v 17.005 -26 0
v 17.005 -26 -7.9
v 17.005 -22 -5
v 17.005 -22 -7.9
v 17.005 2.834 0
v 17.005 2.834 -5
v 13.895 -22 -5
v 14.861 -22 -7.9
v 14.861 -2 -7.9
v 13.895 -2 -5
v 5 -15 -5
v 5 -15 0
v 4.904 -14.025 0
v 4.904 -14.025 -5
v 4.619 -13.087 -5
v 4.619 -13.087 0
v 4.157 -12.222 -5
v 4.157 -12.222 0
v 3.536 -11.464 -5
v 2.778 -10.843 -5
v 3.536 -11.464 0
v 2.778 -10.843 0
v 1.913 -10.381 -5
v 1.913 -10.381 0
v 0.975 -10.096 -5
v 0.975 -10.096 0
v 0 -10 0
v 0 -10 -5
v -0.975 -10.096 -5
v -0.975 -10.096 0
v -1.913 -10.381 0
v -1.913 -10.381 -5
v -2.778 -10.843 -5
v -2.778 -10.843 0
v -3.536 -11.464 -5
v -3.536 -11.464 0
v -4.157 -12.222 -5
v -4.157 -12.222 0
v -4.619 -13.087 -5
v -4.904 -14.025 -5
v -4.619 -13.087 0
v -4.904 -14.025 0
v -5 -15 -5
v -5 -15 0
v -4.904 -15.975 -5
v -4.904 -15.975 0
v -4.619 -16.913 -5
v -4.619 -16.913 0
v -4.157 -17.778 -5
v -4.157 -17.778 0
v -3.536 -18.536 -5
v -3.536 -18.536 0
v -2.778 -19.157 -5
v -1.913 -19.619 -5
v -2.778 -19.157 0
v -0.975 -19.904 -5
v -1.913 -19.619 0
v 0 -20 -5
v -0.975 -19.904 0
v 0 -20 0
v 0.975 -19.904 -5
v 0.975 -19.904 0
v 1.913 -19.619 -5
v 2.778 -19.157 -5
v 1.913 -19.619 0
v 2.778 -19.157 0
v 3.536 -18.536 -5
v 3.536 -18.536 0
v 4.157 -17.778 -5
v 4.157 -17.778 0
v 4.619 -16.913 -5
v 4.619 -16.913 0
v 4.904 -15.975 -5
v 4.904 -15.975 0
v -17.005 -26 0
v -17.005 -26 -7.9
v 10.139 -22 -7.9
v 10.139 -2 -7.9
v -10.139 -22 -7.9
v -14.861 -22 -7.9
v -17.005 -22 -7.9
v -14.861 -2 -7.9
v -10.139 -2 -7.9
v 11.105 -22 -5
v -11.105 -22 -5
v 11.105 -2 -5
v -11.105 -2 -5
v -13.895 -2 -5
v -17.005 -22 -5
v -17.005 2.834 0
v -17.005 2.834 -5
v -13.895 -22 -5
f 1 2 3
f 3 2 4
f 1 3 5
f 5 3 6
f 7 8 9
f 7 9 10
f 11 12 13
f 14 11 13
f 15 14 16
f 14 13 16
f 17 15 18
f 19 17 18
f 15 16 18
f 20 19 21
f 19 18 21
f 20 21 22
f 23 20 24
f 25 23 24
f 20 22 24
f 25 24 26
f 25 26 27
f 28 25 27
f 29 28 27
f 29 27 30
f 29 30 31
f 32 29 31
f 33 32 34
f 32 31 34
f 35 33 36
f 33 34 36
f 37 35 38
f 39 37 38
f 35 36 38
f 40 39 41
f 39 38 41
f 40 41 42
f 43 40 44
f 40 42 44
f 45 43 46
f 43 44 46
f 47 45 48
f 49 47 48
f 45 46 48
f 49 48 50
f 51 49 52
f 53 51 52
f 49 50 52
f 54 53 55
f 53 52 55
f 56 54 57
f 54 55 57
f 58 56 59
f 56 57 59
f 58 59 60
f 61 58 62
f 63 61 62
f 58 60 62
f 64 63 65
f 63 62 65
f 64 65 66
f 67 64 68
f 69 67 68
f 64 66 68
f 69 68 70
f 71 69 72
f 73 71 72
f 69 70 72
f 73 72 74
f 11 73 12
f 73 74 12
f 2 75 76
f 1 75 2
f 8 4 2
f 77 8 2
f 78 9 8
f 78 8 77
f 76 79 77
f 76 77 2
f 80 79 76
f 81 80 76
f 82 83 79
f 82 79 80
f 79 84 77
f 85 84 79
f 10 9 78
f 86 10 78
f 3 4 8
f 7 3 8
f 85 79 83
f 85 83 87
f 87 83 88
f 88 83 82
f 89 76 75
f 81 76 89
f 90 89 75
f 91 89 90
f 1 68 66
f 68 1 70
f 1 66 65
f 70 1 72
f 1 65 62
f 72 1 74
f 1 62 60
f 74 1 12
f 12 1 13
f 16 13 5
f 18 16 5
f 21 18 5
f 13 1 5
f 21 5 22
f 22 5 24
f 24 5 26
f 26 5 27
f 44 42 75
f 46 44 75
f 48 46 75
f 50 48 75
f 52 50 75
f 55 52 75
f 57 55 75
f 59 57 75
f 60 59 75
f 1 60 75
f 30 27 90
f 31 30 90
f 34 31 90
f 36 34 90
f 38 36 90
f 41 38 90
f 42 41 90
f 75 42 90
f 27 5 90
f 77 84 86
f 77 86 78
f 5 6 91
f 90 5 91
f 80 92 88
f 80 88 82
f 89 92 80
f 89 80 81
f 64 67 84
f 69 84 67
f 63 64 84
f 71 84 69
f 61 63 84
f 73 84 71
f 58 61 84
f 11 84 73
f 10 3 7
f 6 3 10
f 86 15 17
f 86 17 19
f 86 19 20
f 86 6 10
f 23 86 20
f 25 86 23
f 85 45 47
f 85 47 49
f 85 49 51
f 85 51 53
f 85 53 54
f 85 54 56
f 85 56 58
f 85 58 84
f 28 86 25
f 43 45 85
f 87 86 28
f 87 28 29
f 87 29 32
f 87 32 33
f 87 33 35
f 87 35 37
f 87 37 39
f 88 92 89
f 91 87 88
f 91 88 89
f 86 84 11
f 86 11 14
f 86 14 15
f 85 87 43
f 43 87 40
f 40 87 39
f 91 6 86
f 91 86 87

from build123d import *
from OCP.BRepFilletAPI import BRepFilletAPI_MakeChamfer

# Parameters (mm, degrees)
SKETCH_1_R          = 5
EXTRUDE_1_DEPTH     = 5
EXTRUDE_2_REACH     = 42.012
EXTRUDE_3_DEPTH     = 55
EXTRUDE_4_DEPTH     = 20
FILLET_1_R          = 10
CHAMFER_1_SIZE      = 1
CHAMFER_1_SIZE2     = 1.741048535
CHAMFER_1_SIZE2_2   = 3.661578825
CHAMFER_1_SIZE2_3   = 2.732050808
CUT_EXTRUDE_1_REACH = 86.876
SKETCH_5_R          = 1.65
SKETCH_6_R          = 54.70604167
CUT_EXTRUDE_2_DEPTH = 66.501221402
SKETCH_7_W          = 77.77608505
SKETCH_7_H          = 88.124851988
SKETCH_7_W_2        = 34.010032192
SKETCH_7_H_2        = 31.175862843
CUT_EXTRUDE_3_DEPTH = 41.477277576


with BuildPart() as part:
    # 草图1 → 凸台-拉伸1 (new body)
    with BuildSketch(Plane.XY):
        Polygon((-20, 26), (20, 26), (30, 0), (20, -26), (-20, -26), (-30, 0), align=None)
        with Locations((0, -15)):
            Circle(SKETCH_1_R, mode=Mode.SUBTRACT)
    extrude(amount=-EXTRUDE_1_DEPTH)

    # 凸台-拉伸2: up to this plane
    extrude_2_end = Plane(origin=(0, 24.665063509, -42.72114317), z_dir=(0, 0.499999999999998, -0.8660254037844398))
    # 草图2 → 凸台-拉伸2 (add, up to the surface)
    with BuildSketch(Plane(origin=(0, 0, -5), x_dir=(-1, 0, 0), z_dir=(0, 0, -1)), mode=Mode.PRIVATE) as extrude_2_sk1:
        Polygon((-20, 26), (20, 26), (21.923076923, 21), (-21.923076923, 21), align=None)
    extrude_2_tool1 = split(extrude(extrude_2_sk1.sketch, amount=EXTRUDE_2_REACH, mode=Mode.PRIVATE), bisect_by=extrude_2_end, keep=Keep.BOTH, mode=Mode.PRIVATE)
    add(extrude_2_tool1.solids().sort_by_distance((0, 23.461774, -5))[0])

    # 草图3 → 凸台-拉伸3 (add)
    with BuildSketch(Plane(origin=(0, 0, -5), x_dir=(-1, 0, 0), z_dir=(0, 0, -1))):
        Polygon((23.846153846, -16), (20, -26), (-20, -26), (-23.846153846, -16), (-19.560495915, -16), (-17.252803607, -22), (17.252803607, -22), (19.560495915, -16), align=None)
    extrude(amount=EXTRUDE_3_DEPTH)

    # 草图4 → 凸台-拉伸4 (add)
    with BuildSketch(Plane(origin=(0, -2, 0), x_dir=(1, 0, 0), z_dir=(0, 1, 0))):
        Polygon((11.105409255, 5), (10.138742589, 7.9), (14.861257411, 7.9), (13.894590745, 5), align=None)
        Polygon((-11.105409255, 5), (-13.894590745, 5), (-14.861257411, 7.9), (-10.138742589, 7.9), align=None)
    extrude(amount=-EXTRUDE_4_DEPTH)

    # 圆角1
    fillet_1_edges = [part.edges().sort_by_distance(p)[0] for p in [
        (-21.70332488, -16, -60),
        (21.70332488, -16, -5),
        (-21.70332488, -16, -5),
        (-20.961538462, 23.5, -43.393792901),
        (20.961538462, 23.5, -43.393792901),
    ]]
    fillet(fillet_1_edges, radius=FILLET_1_R - 0.0001)  # a hair under: the kernel refuses the full size

    # 倒角1: one chamfer whose edges measure the first distance from different faces: ONE call of the kernel's chamfer builder (chamfer() names one face for all edges)
    chamfer_1_edges_1 = [part.edges().sort_by_distance(p)[0] for p in [
        (20, 26, -16.238036635),
    ]]
    chamfer_1_side_1 = [part.faces().sort_by_distance(p)[0] for p in [
        (20.161601575, 25.579835904, -16.238036635),
    ]]
    chamfer_1_edges_2 = [part.edges().sort_by_distance(p)[0] for p in [
        (17.633378474, 26, -39.139308282),
        (-17.633378474, 26, -39.139308282),
    ]]
    chamfer_1_side_2 = [part.faces().sort_by_distance(p)[0] for p in [
        (0, 26, -20.586375743),
    ]]
    chamfer_1_edges_3 = [part.edges().sort_by_distance(p)[0] for p in [
        (0, 26, -41.950417228),
    ]]
    chamfer_1_side_3 = [part.faces().sort_by_distance(p)[0] for p in [
        (0, 26, -20.586375743),
    ]]
    chamfer_1_edges_4 = [part.edges().sort_by_distance(p)[0] for p in [
        (-20, 26, -16.238036635),
    ]]
    chamfer_1_side_4 = [part.faces().sort_by_distance(p)[0] for p in [
        (-21.761475348, 21.420164096, -20.181412308),
    ]]
    chamfer_1 = BRepFilletAPI_MakeChamfer(part.part.solid().wrapped)
    for e in chamfer_1_edges_1:
        chamfer_1.Add(CHAMFER_1_SIZE, CHAMFER_1_SIZE2, e.wrapped, chamfer_1_side_1[0].wrapped)  # the first distance lies on this face
    for e in chamfer_1_edges_2:
        chamfer_1.Add(CHAMFER_1_SIZE, CHAMFER_1_SIZE2_2, e.wrapped, chamfer_1_side_2[0].wrapped)  # the first distance lies on this face
    for e in chamfer_1_edges_3:
        chamfer_1.Add(CHAMFER_1_SIZE, CHAMFER_1_SIZE2_3, e.wrapped, chamfer_1_side_3[0].wrapped)  # the first distance lies on this face
    for e in chamfer_1_edges_4:
        chamfer_1.Add(CHAMFER_1_SIZE, CHAMFER_1_SIZE2, e.wrapped, chamfer_1_side_4[0].wrapped)  # the first distance lies on this face
    add(Compound.cast(chamfer_1.Shape()), mode=Mode.REPLACE)

    # 草图5 → 切除-拉伸1 (cut, up to next)
    with BuildSketch(Plane(origin=(0, 26, 0), x_dir=(1, 0, 0), z_dir=(0, 1, 0)), mode=Mode.PRIVATE) as cut_extrude_1_sk1:
        with Locations((14, 36)):
            Circle(SKETCH_5_R)
    cut_extrude_1_tool1 = extrude(cut_extrude_1_sk1.sketch, amount=-CUT_EXTRUDE_1_REACH, mode=Mode.PRIVATE) & part.part
    # 草图5 → 切除-拉伸1 (cut, up to next)
    with BuildSketch(Plane(origin=(0, 26, 0), x_dir=(1, 0, 0), z_dir=(0, 1, 0)), mode=Mode.PRIVATE) as cut_extrude_1_sk2:
        with Locations((14, 8)):
            Circle(SKETCH_5_R)
    cut_extrude_1_tool2 = extrude(cut_extrude_1_sk2.sketch, amount=-CUT_EXTRUDE_1_REACH, mode=Mode.PRIVATE) & part.part
    # 草图5 → 切除-拉伸1 (cut, up to next)
    with BuildSketch(Plane(origin=(0, 26, 0), x_dir=(1, 0, 0), z_dir=(0, 1, 0)), mode=Mode.PRIVATE) as cut_extrude_1_sk3:
        with Locations((-14, 8)):
            Circle(SKETCH_5_R)
    cut_extrude_1_tool3 = extrude(cut_extrude_1_sk3.sketch, amount=-CUT_EXTRUDE_1_REACH, mode=Mode.PRIVATE) & part.part
    # 草图5 → 切除-拉伸1 (cut, up to next)
    with BuildSketch(Plane(origin=(0, 26, 0), x_dir=(1, 0, 0), z_dir=(0, 1, 0)), mode=Mode.PRIVATE) as cut_extrude_1_sk4:
        with Locations((-14, 36)):
            Circle(SKETCH_5_R)
    cut_extrude_1_tool4 = extrude(cut_extrude_1_sk4.sketch, amount=-CUT_EXTRUDE_1_REACH, mode=Mode.PRIVATE) & part.part
    # 草图5 → 切除-拉伸1 (cut, up to next)
    with BuildSketch(Plane(origin=(0, 26, 0), x_dir=(1, 0, 0), z_dir=(0, 1, 0)), mode=Mode.PRIVATE) as cut_extrude_1_sk5:
        with Locations((10, 22)):
            Circle(SKETCH_5_R)
    cut_extrude_1_tool5 = extrude(cut_extrude_1_sk5.sketch, amount=-CUT_EXTRUDE_1_REACH, mode=Mode.PRIVATE) & part.part
    # 草图5 → 切除-拉伸1 (cut, up to next)
    with BuildSketch(Plane(origin=(0, 26, 0), x_dir=(1, 0, 0), z_dir=(0, 1, 0)), mode=Mode.PRIVATE) as cut_extrude_1_sk6:
        with Locations((-10, 22)):
            Circle(SKETCH_5_R)
    cut_extrude_1_tool6 = extrude(cut_extrude_1_sk6.sketch, amount=-CUT_EXTRUDE_1_REACH, mode=Mode.PRIVATE) & part.part
    # 草图5 → 切除-拉伸1 (cut, up to next)
    with BuildSketch(Plane(origin=(0, 26, 0), x_dir=(1, 0, 0), z_dir=(0, 1, 0)), mode=Mode.PRIVATE) as cut_extrude_1_sk7:
        with Locations((0, 12)):
            Circle(SKETCH_5_R)
    cut_extrude_1_tool7 = extrude(cut_extrude_1_sk7.sketch, amount=-CUT_EXTRUDE_1_REACH, mode=Mode.PRIVATE) & part.part
    # 草图5 → 切除-拉伸1 (cut, up to next)
    with BuildSketch(Plane(origin=(0, 26, 0), x_dir=(1, 0, 0), z_dir=(0, 1, 0)), mode=Mode.PRIVATE) as cut_extrude_1_sk8:
        with Locations((0, 32)):
            Circle(SKETCH_5_R)
    cut_extrude_1_tool8 = extrude(cut_extrude_1_sk8.sketch, amount=-CUT_EXTRUDE_1_REACH, mode=Mode.PRIVATE) & part.part
    add(cut_extrude_1_tool1.solids().sort_by_distance((14, 26, -36))[0], mode=Mode.SUBTRACT)
    add(cut_extrude_1_tool2.solids().sort_by_distance((14, 26, -8))[0], mode=Mode.SUBTRACT)
    add(cut_extrude_1_tool3.solids().sort_by_distance((-14, 26, -8))[0], mode=Mode.SUBTRACT)
    add(cut_extrude_1_tool4.solids().sort_by_distance((-14, 26, -36))[0], mode=Mode.SUBTRACT)
    add(cut_extrude_1_tool5.solids().sort_by_distance((10, 26, -22))[0], mode=Mode.SUBTRACT)
    add(cut_extrude_1_tool6.solids().sort_by_distance((-10, 26, -22))[0], mode=Mode.SUBTRACT)
    add(cut_extrude_1_tool7.solids().sort_by_distance((0, 26, -12))[0], mode=Mode.SUBTRACT)
    add(cut_extrude_1_tool8.solids().sort_by_distance((0, 26, -32))[0], mode=Mode.SUBTRACT)

    # 草图6 → 切除-拉伸2 (cut, through all)
    with BuildSketch(Plane(origin=(0, 0, -7.9), x_dir=(-1, 0, 0), z_dir=(0, 0, -1))):
        with Locations((0, -15)):
            Circle(SKETCH_6_R)
    extrude(amount=CUT_EXTRUDE_2_DEPTH, mode=Mode.SUBTRACT)

    # 草图7 → 切除-拉伸3 (cut, through all)
    with BuildSketch(Plane(origin=(0, 0, -7.9), x_dir=(-1, 0, 0), z_dir=(0, 0, -1))):
        with Locations((0, -12.753762072)):
            Rectangle(SKETCH_7_W, SKETCH_7_H)
        with Locations((0, -12.753762073)):
            Rectangle(SKETCH_7_W_2, SKETCH_7_H_2, mode=Mode.SUBTRACT)
    extrude(amount=-CUT_EXTRUDE_3_DEPTH, mode=Mode.SUBTRACT)


solid = part.part
